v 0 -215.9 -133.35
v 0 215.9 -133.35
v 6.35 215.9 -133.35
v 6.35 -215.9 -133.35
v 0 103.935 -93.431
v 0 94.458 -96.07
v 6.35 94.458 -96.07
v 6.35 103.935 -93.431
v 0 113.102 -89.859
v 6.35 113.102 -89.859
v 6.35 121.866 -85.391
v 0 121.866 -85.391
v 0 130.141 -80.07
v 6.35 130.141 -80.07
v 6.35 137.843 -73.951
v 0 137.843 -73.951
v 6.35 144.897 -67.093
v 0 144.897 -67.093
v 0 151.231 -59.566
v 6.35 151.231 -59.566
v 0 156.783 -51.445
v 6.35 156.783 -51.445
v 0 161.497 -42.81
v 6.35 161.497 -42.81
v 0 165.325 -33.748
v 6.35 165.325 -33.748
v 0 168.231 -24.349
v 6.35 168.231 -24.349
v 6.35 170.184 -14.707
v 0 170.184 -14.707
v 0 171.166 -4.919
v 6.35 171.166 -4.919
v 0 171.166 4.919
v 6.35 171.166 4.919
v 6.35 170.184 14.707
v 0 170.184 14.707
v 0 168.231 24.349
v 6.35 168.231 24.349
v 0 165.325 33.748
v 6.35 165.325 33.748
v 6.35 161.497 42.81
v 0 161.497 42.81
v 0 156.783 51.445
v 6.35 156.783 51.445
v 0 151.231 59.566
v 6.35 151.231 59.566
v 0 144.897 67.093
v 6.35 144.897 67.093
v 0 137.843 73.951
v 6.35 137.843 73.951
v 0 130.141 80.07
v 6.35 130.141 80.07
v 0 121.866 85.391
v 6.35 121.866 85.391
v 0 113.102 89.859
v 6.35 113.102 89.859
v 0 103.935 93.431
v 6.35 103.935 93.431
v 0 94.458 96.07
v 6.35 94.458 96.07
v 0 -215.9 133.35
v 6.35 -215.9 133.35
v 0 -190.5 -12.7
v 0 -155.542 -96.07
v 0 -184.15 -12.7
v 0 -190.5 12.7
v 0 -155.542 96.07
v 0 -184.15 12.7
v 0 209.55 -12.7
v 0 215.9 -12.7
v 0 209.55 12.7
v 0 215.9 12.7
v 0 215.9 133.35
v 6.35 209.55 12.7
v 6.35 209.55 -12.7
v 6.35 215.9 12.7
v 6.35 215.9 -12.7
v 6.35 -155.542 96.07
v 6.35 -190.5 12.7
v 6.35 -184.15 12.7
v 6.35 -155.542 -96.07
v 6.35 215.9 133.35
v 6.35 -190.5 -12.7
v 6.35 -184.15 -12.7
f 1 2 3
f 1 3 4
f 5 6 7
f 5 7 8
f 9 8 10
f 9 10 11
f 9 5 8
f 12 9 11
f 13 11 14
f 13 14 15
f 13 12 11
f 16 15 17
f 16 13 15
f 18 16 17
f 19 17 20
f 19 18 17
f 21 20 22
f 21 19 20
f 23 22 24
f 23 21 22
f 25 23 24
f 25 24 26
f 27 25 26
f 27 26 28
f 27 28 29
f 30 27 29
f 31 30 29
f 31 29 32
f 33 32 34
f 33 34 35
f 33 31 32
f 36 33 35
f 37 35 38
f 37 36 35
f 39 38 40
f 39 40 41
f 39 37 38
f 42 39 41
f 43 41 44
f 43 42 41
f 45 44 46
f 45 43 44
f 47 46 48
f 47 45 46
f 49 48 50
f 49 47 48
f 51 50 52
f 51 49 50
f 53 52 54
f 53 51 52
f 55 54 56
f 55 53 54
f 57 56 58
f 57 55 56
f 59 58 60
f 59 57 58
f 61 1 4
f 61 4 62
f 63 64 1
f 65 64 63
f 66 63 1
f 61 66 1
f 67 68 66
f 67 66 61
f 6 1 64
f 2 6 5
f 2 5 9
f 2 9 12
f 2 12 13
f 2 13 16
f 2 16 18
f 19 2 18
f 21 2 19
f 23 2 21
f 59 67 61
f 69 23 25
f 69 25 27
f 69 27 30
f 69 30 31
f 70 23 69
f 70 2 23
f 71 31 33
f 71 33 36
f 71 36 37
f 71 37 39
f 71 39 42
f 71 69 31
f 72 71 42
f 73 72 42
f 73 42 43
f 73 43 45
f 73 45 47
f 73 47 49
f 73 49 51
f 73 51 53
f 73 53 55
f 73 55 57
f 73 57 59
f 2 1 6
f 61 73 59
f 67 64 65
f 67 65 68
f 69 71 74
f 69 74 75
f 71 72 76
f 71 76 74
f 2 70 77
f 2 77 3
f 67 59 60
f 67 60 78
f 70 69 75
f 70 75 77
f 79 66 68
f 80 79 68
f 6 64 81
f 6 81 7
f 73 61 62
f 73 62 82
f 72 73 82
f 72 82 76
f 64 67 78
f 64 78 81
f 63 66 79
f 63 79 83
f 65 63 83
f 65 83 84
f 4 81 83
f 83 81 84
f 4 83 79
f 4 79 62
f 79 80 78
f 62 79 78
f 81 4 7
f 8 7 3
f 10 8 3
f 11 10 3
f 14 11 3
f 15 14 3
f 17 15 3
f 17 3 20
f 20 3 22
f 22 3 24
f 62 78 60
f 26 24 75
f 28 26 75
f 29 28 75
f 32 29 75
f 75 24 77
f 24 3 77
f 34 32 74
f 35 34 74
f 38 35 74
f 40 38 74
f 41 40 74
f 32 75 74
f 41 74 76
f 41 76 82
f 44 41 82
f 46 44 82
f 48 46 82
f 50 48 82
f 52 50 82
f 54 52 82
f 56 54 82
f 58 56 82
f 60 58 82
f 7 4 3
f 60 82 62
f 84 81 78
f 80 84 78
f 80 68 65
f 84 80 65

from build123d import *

# Parameters (mm, degrees)
SKETCH1_W           = 25.4
SKETCH1_H           = 6.35
BOSS_EXTRUDE1_DEPTH = 6.35


with BuildPart() as part:
    # Sketch1 → Boss-Extrude1 (new body)
    with BuildSketch(Plane(origin=(0, 0, 0), x_dir=(0, 0, -1), z_dir=(1, 0, 0))):
        Polygon((12.7, 215.9), (133.35, 215.9), (133.35, -215.9), (-133.35, -215.9), (-133.35, 215.9), (-12.7, 215.9), (-12.7, 209.55), (12.7, 209.55), align=None)
        with Locations((0, -187.325)):
            Rectangle(SKETCH1_W, SKETCH1_H, mode=Mode.SUBTRACT)
        with BuildLine():
            Line((-96.07, 94.458095238), (-96.07, -155.541904762))
            Line((-96.07, -155.541904762), (96.07, -155.541904762))
            Line((96.07, -155.541904762), (96.07, 94.458095238))
            ThreePointArc((96.07, 94.458095238), (0, 171.288491158), (-96.07, 94.458095238))
        make_face(mode=Mode.SUBTRACT)
    extrude(amount=BOSS_EXTRUDE1_DEPTH)


solid = part.part
